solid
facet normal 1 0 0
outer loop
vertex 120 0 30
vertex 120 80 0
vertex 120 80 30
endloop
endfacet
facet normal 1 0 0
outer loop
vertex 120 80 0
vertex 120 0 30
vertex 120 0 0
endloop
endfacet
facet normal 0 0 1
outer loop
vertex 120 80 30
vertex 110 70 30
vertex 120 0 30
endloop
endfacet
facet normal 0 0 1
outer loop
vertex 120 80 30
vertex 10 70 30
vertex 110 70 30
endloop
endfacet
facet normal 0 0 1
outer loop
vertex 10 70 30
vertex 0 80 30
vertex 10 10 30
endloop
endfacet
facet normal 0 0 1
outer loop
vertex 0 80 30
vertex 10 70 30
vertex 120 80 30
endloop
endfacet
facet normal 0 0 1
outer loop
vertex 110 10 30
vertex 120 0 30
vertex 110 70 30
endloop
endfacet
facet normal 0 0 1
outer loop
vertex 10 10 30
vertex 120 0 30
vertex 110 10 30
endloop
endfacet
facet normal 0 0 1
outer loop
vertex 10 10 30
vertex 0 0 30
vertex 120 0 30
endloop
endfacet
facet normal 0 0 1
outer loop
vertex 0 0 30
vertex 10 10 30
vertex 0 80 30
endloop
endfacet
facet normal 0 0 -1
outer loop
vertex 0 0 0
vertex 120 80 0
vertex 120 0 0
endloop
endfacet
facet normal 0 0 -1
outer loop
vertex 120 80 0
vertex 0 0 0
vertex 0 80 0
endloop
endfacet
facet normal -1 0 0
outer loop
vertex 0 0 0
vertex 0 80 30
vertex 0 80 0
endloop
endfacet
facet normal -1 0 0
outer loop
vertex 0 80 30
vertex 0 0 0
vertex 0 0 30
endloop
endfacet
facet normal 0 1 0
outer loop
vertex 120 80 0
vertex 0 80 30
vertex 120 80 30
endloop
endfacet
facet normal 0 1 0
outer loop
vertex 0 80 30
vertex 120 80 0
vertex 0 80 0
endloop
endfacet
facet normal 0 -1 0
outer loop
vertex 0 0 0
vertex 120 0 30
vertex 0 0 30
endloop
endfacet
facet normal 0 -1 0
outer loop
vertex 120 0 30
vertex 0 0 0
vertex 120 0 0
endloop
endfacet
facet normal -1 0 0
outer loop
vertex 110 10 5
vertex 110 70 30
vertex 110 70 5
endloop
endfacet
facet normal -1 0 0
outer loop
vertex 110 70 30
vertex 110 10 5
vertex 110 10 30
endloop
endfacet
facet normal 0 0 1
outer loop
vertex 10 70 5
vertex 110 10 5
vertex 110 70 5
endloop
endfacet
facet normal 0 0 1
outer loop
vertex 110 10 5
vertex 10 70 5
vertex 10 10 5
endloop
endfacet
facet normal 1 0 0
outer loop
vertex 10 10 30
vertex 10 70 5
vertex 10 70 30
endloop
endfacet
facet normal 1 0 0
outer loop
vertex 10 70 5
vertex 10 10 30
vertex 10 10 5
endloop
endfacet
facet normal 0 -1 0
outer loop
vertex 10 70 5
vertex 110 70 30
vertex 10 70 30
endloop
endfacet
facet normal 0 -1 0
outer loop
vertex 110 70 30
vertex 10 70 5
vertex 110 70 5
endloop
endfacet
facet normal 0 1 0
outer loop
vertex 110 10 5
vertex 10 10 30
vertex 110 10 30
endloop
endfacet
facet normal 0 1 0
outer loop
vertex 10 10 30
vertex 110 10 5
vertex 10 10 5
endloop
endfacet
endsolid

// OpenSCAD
// Simple 3D-printed sensor mount for TPBR piezo + ESP32
$fn=60;
difference() {
  cube([120,80,30]);
  translate([10,10,5]) cube([100,60,30]); // piezo recess
}
echo("Print this and mount your TPBR stack inside");
